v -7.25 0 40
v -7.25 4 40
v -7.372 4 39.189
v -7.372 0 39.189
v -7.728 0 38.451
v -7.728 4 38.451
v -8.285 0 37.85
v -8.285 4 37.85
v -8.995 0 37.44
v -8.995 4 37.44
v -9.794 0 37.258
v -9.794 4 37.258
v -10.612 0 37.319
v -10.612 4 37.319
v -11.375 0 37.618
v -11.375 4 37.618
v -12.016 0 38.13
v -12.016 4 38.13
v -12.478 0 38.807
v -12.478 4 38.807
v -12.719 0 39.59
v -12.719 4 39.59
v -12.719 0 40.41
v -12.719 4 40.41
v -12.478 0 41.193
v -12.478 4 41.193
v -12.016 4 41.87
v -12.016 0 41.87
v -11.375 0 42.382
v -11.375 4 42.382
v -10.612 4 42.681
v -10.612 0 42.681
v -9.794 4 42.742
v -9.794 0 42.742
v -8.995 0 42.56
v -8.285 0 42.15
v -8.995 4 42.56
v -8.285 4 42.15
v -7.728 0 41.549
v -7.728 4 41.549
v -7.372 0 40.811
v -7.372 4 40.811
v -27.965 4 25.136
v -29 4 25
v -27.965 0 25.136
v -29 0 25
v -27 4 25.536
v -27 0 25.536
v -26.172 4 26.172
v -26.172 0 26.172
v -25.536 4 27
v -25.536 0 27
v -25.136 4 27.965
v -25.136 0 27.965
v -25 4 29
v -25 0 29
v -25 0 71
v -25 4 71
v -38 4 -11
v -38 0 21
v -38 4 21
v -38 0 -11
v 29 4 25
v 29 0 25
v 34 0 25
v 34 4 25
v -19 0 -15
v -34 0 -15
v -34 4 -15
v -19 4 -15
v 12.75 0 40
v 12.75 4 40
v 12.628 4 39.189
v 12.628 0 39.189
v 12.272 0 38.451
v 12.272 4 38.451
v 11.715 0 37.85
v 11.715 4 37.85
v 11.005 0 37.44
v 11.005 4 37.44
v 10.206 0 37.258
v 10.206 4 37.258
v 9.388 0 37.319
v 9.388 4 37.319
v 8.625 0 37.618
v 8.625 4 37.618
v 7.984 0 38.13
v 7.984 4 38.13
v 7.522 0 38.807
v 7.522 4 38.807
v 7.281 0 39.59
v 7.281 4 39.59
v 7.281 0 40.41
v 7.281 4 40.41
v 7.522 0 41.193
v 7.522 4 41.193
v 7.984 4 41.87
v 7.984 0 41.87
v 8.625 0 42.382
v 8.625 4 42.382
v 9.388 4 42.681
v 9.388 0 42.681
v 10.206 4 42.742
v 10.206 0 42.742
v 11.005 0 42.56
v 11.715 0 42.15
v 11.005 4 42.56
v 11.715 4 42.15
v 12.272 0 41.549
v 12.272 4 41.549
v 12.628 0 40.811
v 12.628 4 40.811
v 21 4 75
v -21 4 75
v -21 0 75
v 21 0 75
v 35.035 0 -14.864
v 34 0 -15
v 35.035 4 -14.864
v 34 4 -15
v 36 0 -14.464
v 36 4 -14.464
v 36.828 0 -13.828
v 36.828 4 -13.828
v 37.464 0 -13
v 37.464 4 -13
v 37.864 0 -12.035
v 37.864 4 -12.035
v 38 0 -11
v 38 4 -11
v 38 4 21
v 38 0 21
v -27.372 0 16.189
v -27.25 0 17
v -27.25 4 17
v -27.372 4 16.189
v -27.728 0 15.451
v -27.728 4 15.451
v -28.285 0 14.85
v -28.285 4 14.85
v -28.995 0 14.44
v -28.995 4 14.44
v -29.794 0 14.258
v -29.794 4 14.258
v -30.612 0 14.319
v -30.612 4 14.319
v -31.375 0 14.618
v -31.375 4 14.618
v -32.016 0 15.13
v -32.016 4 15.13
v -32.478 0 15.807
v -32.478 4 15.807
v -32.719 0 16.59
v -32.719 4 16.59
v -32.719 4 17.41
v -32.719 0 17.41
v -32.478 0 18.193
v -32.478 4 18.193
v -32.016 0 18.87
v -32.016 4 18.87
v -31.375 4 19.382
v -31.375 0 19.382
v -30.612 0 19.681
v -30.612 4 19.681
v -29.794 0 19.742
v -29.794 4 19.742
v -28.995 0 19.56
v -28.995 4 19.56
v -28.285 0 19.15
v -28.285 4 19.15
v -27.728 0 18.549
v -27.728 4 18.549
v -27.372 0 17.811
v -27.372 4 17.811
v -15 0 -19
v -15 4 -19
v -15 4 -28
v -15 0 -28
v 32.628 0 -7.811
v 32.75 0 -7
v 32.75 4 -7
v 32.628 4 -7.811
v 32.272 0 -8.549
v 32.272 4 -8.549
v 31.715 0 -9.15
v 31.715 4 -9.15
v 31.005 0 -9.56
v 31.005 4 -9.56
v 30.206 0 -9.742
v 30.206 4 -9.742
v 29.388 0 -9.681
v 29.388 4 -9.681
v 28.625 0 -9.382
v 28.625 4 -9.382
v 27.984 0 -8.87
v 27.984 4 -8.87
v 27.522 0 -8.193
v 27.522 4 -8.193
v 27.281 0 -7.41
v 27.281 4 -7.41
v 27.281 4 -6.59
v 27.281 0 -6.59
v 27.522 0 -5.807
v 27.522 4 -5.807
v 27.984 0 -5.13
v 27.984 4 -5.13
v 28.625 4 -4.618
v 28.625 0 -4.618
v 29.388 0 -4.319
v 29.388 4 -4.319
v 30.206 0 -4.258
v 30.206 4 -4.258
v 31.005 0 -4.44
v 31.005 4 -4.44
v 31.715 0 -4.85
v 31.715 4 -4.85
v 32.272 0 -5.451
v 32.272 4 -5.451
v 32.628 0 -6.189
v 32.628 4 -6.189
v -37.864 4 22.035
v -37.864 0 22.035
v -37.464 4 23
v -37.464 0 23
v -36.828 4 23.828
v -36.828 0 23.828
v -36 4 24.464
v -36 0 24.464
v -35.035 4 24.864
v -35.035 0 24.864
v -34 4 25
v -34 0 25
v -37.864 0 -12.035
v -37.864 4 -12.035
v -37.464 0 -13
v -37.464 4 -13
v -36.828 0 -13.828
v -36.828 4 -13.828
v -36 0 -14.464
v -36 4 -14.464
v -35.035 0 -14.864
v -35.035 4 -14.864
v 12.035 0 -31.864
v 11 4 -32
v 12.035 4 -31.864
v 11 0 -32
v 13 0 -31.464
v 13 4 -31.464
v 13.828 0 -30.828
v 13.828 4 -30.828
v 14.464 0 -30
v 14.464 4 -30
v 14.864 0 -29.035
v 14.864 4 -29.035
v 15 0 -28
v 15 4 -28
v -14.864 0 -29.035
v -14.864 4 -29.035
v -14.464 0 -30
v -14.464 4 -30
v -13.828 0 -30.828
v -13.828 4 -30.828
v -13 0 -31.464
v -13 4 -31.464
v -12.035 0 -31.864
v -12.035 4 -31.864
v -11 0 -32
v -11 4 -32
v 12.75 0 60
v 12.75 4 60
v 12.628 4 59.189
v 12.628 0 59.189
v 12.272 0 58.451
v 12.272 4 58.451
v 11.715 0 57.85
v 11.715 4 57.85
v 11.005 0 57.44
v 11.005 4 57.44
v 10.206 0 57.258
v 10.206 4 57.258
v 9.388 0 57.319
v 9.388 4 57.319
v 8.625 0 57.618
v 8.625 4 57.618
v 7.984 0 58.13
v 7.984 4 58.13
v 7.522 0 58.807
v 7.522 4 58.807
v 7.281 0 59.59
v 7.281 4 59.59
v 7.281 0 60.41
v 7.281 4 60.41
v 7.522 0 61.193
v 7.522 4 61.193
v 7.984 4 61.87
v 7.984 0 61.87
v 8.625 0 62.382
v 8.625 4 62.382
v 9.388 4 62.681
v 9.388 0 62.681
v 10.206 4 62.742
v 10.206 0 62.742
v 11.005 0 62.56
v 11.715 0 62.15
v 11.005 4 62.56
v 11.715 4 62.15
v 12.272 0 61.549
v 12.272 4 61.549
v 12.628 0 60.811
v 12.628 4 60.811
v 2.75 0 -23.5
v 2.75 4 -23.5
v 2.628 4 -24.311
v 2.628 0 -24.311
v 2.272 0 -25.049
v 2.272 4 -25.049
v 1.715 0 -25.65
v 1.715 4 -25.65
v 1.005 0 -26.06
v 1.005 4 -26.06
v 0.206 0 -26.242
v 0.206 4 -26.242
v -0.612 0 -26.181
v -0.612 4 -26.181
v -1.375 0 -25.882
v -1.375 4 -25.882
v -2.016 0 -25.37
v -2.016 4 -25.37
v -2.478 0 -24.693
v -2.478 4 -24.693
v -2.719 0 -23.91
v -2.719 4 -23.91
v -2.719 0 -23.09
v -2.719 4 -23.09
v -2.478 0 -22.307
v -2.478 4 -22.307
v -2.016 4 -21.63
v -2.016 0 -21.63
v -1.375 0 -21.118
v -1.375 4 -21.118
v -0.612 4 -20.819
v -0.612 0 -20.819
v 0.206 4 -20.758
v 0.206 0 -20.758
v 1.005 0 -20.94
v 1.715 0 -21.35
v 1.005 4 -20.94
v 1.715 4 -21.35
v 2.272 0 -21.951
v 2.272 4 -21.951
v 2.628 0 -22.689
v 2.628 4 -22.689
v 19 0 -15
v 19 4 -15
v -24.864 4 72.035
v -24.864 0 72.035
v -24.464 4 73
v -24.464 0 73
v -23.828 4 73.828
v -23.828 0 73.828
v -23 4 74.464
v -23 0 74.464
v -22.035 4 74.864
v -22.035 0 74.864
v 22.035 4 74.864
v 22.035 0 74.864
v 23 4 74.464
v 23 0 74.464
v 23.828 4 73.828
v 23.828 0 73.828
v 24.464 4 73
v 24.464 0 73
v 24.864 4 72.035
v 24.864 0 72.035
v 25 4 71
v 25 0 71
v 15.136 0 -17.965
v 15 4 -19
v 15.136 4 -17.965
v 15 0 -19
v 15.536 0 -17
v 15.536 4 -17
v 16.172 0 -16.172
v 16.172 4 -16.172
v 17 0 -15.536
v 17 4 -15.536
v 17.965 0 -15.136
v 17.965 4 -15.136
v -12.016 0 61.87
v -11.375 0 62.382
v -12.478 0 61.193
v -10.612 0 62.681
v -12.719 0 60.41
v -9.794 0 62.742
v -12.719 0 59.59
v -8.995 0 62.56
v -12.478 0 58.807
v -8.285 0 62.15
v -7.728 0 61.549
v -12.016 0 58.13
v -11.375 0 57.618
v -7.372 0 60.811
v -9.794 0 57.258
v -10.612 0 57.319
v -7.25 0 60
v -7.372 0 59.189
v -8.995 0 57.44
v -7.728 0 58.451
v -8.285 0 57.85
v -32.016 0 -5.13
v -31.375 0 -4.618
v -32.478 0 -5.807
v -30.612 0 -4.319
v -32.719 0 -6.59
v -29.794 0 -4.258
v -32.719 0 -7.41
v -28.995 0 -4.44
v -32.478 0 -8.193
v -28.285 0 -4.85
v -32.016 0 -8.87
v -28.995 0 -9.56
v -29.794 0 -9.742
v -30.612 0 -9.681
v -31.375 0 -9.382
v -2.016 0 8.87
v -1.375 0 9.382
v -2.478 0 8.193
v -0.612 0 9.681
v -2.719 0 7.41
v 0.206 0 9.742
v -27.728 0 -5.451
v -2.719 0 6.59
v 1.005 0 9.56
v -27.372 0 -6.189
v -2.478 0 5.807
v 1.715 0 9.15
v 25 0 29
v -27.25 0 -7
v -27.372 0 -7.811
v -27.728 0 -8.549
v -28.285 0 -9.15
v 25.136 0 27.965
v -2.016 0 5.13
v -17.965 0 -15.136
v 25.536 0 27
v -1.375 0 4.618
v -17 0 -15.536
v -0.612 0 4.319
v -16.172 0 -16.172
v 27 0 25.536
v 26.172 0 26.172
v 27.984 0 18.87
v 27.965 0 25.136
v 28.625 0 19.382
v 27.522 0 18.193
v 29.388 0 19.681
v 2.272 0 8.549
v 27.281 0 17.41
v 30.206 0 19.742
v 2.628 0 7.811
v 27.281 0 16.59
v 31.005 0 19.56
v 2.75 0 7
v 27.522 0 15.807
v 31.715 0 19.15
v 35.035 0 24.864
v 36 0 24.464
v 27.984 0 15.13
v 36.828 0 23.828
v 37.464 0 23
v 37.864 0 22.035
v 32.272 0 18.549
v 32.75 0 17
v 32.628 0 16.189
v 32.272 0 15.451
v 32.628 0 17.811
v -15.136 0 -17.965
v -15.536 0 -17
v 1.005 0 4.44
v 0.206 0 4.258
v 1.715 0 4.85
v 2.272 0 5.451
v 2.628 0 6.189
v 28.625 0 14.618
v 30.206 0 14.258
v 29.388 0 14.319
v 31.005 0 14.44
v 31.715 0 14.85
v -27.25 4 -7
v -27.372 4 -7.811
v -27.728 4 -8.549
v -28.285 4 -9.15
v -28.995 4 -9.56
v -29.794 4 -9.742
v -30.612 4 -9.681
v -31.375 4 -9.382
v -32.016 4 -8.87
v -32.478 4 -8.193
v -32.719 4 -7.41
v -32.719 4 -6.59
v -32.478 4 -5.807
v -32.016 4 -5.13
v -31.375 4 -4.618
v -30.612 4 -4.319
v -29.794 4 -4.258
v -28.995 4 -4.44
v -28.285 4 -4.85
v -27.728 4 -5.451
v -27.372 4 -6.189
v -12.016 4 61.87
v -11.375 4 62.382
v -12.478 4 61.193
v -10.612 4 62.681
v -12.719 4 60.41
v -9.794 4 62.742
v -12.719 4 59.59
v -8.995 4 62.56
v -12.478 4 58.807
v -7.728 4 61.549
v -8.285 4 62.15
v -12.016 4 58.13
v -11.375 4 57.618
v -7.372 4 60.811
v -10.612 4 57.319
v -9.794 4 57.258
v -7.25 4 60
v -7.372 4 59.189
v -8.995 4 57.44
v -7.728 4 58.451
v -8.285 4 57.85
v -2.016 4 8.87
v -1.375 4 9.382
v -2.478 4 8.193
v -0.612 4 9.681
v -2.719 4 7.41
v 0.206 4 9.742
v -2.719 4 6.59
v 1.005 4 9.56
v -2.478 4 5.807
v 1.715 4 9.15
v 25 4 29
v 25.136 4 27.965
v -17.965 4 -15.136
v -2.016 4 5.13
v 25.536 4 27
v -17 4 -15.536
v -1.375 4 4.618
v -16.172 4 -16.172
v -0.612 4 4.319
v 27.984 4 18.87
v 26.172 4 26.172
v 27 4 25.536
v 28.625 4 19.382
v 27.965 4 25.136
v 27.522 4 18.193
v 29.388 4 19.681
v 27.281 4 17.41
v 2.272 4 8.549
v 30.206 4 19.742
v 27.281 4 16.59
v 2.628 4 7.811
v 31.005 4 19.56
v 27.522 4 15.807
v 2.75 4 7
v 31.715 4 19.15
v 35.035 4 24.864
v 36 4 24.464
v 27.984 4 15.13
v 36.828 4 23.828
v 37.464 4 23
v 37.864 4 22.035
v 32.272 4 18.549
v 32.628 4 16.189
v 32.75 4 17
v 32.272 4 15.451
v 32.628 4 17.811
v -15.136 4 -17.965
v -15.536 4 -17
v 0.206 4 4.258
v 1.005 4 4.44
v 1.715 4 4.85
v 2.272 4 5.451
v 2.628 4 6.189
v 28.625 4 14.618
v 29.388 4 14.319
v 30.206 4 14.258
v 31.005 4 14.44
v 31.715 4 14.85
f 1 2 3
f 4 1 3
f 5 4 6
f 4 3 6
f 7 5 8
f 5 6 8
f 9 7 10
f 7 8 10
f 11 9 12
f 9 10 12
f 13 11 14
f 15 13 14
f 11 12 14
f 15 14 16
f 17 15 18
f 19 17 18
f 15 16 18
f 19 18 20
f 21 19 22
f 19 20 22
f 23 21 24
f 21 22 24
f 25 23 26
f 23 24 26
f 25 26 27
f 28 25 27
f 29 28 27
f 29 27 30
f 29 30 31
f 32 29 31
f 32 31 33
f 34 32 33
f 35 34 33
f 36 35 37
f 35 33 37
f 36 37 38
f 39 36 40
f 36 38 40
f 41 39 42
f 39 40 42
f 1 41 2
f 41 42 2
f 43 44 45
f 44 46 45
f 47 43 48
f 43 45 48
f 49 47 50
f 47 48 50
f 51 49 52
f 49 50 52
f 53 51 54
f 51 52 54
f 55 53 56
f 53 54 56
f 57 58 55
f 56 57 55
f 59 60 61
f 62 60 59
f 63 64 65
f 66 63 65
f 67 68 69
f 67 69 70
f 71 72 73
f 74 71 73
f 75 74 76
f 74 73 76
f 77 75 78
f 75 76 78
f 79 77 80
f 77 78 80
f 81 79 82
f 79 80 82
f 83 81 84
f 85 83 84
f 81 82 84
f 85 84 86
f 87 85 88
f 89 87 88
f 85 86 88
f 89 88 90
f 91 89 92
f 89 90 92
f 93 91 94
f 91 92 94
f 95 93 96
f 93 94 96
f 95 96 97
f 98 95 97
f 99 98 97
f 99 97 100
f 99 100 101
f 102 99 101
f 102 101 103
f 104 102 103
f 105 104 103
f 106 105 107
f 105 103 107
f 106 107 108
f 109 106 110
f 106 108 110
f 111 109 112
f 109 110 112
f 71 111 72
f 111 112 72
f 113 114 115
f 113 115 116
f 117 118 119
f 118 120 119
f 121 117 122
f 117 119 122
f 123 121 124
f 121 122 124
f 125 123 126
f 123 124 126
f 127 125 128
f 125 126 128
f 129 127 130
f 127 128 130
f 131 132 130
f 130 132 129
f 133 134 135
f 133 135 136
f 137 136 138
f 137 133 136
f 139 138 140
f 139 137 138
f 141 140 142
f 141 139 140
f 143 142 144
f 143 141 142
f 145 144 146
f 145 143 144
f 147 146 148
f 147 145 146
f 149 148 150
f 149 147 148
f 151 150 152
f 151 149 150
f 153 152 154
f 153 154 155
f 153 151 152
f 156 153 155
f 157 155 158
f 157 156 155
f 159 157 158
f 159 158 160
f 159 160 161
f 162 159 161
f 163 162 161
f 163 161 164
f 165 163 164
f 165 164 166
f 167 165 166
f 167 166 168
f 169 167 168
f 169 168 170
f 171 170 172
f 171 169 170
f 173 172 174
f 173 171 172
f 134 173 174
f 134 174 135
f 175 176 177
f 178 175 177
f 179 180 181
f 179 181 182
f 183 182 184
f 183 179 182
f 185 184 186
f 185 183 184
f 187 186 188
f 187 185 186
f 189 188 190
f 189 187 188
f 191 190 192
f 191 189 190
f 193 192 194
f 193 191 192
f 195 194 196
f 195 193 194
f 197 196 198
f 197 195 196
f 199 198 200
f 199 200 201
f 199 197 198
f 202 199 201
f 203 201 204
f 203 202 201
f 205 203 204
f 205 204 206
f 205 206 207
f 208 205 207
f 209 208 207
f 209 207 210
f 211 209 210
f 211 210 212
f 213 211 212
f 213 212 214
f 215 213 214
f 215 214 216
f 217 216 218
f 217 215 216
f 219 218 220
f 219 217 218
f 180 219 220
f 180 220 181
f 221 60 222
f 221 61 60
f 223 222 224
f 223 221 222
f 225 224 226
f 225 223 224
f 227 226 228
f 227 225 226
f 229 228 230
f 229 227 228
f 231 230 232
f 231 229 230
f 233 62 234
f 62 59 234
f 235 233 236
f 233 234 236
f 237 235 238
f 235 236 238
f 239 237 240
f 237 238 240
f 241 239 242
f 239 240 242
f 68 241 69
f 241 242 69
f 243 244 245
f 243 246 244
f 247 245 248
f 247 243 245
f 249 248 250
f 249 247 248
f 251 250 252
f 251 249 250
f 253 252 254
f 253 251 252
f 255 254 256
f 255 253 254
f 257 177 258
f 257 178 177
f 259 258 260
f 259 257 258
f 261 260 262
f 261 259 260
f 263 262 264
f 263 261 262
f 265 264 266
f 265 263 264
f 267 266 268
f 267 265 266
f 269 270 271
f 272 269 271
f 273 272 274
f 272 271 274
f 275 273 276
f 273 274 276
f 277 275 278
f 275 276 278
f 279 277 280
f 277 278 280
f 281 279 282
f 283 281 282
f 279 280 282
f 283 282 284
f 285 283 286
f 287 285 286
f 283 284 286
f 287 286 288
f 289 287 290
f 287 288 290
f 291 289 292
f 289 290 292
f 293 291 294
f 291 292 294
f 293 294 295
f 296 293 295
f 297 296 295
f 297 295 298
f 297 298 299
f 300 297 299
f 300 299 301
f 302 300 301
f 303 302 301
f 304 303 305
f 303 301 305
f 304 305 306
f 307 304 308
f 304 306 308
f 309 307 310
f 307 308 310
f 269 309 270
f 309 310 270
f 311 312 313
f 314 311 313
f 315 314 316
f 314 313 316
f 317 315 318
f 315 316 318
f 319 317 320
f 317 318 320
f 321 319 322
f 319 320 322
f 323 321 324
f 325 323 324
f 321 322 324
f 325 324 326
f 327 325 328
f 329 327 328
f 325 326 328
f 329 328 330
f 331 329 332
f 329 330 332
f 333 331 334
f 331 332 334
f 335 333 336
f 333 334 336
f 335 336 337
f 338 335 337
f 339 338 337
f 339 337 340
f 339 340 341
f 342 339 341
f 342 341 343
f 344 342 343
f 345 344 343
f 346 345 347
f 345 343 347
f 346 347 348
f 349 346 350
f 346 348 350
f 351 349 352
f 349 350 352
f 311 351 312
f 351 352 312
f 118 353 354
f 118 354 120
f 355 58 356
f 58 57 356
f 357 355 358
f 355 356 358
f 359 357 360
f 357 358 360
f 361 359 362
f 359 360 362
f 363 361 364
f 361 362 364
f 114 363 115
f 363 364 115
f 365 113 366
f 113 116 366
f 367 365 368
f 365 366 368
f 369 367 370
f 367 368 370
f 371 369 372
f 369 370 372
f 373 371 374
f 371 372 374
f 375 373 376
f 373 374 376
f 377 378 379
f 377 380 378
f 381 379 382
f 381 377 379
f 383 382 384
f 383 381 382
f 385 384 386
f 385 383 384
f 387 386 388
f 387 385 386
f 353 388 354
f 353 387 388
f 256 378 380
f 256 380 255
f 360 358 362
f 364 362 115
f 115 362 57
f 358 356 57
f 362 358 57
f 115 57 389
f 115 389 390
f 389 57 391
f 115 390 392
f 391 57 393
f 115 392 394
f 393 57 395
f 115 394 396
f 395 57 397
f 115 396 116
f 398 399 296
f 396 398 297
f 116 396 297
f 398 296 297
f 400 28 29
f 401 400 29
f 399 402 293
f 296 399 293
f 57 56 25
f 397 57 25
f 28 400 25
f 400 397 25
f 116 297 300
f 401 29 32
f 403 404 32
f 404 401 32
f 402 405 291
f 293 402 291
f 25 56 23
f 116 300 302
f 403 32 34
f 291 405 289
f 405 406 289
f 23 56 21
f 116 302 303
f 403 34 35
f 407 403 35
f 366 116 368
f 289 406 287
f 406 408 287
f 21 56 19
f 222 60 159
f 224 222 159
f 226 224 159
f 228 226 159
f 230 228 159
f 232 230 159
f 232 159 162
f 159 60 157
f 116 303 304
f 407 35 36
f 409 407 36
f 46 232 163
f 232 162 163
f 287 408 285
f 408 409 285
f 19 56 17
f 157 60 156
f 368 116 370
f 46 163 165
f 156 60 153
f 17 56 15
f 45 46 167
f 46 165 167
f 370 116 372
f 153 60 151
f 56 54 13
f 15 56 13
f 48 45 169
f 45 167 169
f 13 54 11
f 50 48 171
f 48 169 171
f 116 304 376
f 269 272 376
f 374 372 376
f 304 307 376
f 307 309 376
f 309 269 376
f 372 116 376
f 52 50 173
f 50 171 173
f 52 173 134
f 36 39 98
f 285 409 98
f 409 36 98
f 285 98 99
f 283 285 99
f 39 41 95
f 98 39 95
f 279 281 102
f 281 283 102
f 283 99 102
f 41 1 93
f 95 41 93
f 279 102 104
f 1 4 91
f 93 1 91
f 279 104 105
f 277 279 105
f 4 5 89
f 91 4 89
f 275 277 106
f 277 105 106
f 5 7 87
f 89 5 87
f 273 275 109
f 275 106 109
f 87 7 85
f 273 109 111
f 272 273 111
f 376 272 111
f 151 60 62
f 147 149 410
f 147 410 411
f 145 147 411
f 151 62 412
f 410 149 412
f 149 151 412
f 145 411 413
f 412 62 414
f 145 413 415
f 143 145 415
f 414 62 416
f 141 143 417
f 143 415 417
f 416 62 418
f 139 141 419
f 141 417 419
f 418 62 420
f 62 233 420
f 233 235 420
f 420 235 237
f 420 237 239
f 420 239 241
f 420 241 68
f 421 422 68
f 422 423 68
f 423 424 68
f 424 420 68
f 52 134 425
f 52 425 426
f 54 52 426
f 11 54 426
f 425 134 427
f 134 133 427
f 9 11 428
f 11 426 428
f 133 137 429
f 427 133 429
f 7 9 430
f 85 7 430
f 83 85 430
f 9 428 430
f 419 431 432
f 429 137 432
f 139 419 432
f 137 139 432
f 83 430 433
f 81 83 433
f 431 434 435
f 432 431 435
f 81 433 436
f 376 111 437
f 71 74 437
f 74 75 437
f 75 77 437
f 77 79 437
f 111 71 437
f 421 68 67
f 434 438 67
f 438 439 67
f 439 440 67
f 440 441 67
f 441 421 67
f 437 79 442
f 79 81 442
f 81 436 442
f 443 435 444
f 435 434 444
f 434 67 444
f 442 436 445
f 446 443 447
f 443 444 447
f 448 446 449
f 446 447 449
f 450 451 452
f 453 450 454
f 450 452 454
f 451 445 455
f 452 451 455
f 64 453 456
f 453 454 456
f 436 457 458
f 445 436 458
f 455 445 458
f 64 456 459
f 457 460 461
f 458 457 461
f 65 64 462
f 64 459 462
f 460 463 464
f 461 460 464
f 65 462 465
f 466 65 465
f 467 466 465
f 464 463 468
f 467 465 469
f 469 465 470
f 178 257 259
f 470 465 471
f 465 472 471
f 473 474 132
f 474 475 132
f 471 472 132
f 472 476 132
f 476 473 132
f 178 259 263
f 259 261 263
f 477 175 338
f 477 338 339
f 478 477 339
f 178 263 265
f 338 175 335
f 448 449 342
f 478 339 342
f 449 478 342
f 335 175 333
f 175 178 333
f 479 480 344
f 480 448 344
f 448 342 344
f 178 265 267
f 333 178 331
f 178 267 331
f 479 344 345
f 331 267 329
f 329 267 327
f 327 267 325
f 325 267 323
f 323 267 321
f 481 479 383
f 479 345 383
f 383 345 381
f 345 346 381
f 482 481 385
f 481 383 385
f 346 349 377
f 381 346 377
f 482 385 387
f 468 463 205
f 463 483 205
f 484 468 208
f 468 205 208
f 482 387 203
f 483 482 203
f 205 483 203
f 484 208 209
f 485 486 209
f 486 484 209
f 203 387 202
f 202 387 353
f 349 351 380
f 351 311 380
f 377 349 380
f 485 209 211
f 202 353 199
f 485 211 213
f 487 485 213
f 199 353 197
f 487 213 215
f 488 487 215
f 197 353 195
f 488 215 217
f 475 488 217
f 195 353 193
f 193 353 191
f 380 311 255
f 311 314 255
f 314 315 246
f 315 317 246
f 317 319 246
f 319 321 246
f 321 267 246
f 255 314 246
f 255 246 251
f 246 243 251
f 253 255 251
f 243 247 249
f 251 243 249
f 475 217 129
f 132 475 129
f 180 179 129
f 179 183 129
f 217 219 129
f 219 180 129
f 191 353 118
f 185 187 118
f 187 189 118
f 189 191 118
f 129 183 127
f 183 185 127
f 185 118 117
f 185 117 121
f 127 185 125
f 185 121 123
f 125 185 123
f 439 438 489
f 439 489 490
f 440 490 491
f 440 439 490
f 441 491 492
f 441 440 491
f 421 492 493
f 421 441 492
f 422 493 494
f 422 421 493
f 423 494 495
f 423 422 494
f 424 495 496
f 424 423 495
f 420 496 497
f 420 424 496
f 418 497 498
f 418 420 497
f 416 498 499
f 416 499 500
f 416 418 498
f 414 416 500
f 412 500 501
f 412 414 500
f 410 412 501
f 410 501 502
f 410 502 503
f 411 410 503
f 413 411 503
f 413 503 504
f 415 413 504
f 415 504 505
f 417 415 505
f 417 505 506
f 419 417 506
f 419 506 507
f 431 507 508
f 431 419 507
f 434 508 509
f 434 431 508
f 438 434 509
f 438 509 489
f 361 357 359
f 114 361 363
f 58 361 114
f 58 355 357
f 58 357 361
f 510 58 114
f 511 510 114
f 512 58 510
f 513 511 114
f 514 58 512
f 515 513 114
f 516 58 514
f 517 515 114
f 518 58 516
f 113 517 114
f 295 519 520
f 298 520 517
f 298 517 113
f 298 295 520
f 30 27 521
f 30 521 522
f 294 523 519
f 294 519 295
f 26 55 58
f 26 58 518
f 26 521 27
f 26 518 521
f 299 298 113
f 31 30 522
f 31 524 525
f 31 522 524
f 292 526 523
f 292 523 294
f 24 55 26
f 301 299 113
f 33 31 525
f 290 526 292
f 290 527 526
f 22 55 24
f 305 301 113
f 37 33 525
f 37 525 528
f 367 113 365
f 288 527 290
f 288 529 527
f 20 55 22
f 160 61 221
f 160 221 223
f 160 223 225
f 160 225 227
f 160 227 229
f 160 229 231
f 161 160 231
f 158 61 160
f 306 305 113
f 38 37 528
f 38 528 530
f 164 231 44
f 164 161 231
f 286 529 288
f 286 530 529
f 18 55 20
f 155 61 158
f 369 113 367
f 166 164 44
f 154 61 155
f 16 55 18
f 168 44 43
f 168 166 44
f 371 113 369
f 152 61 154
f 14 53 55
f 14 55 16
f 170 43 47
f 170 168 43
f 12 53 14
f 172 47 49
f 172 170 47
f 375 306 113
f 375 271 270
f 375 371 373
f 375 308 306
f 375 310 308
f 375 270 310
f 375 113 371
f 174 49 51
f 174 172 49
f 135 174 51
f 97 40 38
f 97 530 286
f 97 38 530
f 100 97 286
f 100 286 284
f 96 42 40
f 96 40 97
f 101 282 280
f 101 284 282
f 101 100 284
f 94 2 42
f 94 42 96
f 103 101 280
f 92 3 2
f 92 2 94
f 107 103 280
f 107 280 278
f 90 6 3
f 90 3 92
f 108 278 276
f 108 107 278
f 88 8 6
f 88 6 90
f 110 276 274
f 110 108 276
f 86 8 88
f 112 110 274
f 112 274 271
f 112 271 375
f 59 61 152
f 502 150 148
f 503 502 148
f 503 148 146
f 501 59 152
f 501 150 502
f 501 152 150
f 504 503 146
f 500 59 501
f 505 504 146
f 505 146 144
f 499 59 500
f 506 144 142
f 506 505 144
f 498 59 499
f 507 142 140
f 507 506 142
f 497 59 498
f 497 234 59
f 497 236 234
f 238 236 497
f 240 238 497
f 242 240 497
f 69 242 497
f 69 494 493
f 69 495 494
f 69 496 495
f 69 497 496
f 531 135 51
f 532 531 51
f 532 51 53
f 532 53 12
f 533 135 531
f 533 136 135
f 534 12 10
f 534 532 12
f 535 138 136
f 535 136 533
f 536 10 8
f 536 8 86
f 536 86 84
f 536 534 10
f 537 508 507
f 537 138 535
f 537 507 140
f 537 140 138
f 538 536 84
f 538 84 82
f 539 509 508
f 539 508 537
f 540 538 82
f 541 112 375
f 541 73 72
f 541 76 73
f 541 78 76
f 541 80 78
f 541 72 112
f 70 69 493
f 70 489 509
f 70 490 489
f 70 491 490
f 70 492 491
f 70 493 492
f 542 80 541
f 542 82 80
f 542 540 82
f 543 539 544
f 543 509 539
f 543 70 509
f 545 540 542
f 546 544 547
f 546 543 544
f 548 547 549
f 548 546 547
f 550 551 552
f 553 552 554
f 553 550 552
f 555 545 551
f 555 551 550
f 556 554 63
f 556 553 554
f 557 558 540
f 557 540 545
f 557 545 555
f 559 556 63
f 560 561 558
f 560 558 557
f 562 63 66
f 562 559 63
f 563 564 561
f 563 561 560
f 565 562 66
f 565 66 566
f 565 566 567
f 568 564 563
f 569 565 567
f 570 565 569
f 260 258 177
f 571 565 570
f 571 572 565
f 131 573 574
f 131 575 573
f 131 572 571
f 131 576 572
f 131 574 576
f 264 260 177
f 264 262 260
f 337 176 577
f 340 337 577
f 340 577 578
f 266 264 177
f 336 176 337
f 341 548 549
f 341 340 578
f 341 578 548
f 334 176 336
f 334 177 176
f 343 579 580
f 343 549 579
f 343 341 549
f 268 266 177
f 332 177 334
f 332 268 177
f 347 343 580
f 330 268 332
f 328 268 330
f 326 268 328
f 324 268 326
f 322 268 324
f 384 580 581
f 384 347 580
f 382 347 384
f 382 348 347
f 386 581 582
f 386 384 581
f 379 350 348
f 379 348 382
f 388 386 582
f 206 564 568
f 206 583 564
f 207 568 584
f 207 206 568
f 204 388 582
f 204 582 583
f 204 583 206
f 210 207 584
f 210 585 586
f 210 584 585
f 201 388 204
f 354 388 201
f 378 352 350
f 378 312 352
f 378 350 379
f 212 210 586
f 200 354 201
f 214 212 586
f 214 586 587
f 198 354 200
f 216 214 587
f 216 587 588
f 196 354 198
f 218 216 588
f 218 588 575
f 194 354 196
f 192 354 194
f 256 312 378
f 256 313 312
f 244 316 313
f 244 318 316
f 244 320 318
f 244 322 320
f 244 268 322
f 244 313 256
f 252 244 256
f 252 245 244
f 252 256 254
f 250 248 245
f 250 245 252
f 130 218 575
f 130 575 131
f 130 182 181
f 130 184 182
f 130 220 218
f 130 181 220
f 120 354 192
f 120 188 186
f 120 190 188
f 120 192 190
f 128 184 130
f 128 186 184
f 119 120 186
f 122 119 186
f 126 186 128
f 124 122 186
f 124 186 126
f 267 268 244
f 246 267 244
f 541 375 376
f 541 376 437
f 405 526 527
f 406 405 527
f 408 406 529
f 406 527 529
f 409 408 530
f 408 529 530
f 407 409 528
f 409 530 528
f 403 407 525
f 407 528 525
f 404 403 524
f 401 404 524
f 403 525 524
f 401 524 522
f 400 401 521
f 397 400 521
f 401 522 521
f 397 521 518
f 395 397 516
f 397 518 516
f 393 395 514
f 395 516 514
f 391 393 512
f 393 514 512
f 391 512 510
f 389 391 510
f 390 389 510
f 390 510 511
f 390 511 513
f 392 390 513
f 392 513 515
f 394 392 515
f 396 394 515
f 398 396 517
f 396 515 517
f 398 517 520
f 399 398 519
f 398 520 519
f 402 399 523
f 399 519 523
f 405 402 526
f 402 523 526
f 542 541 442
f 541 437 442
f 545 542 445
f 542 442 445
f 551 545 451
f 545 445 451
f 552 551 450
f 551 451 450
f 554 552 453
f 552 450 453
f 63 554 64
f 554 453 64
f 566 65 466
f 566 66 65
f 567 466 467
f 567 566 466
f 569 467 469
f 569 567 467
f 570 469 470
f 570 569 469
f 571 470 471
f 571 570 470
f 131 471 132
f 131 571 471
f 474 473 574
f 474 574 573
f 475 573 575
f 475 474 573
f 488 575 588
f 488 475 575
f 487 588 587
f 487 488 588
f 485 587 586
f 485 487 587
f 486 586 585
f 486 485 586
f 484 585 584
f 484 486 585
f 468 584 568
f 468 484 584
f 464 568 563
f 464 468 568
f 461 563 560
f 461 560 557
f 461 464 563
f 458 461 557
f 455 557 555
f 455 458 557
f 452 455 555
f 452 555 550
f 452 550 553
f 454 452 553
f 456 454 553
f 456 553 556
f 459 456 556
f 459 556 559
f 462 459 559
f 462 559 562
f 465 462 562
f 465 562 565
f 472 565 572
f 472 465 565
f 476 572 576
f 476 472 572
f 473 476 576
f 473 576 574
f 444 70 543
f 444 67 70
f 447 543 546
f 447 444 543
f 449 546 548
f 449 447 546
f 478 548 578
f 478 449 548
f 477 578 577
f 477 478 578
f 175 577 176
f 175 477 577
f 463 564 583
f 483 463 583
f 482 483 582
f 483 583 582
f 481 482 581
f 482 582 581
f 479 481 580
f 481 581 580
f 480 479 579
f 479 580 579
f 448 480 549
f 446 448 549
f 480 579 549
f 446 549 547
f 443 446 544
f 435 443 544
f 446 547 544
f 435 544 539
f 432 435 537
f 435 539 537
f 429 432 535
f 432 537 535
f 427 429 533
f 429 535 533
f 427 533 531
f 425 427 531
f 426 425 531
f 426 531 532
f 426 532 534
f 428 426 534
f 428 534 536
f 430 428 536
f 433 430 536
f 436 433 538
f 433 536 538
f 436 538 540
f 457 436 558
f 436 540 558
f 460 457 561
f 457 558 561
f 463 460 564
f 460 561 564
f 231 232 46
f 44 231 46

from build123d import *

# Parameters (mm, degrees)
SKETCH1_W           = 76
SKETCH1_H           = 40
SKETCH1_R           = 2.75
BOSS_EXTRUDE1_DEPTH = 4
SKETCH2_W           = 50
SKETCH2_H           = 50
SKETCH2_W_2         = 30
SKETCH2_H_2         = 17
BOSS_EXTRUDE2_DEPTH = 4
SKETCH3_R           = 2.75
CUT_EXTRUDE1_DEPTH  = 4
FILLET1_R           = 4


with BuildPart() as part:
    # Sketch1 → Boss-Extrude1 (new body)
    with BuildSketch(Plane(origin=(0, 0, 0), x_dir=(1, 0, 0), z_dir=(0, 1, 0))):
        with Locations((0, -5)):
            Rectangle(SKETCH1_W, SKETCH1_H)
        with Locations((-30, 7)):
            Circle(SKETCH1_R, mode=Mode.SUBTRACT)
        with Locations((30, 7)):
            Circle(SKETCH1_R, mode=Mode.SUBTRACT)
        with Locations((-30, -17)):
            Circle(SKETCH1_R, mode=Mode.SUBTRACT)
        with Locations((30, -17)):
            Circle(SKETCH1_R, mode=Mode.SUBTRACT)
    extrude(amount=BOSS_EXTRUDE1_DEPTH)

    # Sketch2 → Boss-Extrude2 (add)
    with BuildSketch(Plane(origin=(0, 4, 0), x_dir=(1, 0, 0), z_dir=(0, 1, 0))):
        with Locations((0, -50)):
            Rectangle(SKETCH2_W, SKETCH2_H)
        with Locations((0, 23.5)):
            Rectangle(SKETCH2_W_2, SKETCH2_H_2)
    extrude(amount=-BOSS_EXTRUDE2_DEPTH)

    # Sketch3 → Cut-Extrude1 (cut)
    with BuildSketch(Plane(origin=(0, 4, 0), x_dir=(1, 0, 0), z_dir=(0, 1, 0))):
        with Locations((0, 23.5)):
            Circle(SKETCH3_R)
        with Locations((0, -7)):
            Circle(SKETCH3_R)
        with Locations((-10, -40)):
            Circle(SKETCH3_R)
        with Locations((10, -40)):
            Circle(SKETCH3_R)
        with Locations((-10, -60)):
            Circle(SKETCH3_R)
        with Locations((10, -60)):
            Circle(SKETCH3_R)
    extrude(amount=-CUT_EXTRUDE1_DEPTH, mode=Mode.SUBTRACT)

    # Fillet1
    fillet1_edges = [part.edges().sort_by_distance(p)[0] for p in [
        (-25, 2, 75),
        (25, 2, 75),
        (25, 2, 25),
        (38, 2, 25),
        (38, 2, -15),
        (-38, 2, -15),
        (-38, 2, 25),
        (-25, 2, 25),
        (15, 2, -15),
        (15, 2, -32),
        (-15, 2, -32),
        (-15, 2, -15),
    ]]
    fillet(fillet1_edges, radius=FILLET1_R)


solid = part.part
